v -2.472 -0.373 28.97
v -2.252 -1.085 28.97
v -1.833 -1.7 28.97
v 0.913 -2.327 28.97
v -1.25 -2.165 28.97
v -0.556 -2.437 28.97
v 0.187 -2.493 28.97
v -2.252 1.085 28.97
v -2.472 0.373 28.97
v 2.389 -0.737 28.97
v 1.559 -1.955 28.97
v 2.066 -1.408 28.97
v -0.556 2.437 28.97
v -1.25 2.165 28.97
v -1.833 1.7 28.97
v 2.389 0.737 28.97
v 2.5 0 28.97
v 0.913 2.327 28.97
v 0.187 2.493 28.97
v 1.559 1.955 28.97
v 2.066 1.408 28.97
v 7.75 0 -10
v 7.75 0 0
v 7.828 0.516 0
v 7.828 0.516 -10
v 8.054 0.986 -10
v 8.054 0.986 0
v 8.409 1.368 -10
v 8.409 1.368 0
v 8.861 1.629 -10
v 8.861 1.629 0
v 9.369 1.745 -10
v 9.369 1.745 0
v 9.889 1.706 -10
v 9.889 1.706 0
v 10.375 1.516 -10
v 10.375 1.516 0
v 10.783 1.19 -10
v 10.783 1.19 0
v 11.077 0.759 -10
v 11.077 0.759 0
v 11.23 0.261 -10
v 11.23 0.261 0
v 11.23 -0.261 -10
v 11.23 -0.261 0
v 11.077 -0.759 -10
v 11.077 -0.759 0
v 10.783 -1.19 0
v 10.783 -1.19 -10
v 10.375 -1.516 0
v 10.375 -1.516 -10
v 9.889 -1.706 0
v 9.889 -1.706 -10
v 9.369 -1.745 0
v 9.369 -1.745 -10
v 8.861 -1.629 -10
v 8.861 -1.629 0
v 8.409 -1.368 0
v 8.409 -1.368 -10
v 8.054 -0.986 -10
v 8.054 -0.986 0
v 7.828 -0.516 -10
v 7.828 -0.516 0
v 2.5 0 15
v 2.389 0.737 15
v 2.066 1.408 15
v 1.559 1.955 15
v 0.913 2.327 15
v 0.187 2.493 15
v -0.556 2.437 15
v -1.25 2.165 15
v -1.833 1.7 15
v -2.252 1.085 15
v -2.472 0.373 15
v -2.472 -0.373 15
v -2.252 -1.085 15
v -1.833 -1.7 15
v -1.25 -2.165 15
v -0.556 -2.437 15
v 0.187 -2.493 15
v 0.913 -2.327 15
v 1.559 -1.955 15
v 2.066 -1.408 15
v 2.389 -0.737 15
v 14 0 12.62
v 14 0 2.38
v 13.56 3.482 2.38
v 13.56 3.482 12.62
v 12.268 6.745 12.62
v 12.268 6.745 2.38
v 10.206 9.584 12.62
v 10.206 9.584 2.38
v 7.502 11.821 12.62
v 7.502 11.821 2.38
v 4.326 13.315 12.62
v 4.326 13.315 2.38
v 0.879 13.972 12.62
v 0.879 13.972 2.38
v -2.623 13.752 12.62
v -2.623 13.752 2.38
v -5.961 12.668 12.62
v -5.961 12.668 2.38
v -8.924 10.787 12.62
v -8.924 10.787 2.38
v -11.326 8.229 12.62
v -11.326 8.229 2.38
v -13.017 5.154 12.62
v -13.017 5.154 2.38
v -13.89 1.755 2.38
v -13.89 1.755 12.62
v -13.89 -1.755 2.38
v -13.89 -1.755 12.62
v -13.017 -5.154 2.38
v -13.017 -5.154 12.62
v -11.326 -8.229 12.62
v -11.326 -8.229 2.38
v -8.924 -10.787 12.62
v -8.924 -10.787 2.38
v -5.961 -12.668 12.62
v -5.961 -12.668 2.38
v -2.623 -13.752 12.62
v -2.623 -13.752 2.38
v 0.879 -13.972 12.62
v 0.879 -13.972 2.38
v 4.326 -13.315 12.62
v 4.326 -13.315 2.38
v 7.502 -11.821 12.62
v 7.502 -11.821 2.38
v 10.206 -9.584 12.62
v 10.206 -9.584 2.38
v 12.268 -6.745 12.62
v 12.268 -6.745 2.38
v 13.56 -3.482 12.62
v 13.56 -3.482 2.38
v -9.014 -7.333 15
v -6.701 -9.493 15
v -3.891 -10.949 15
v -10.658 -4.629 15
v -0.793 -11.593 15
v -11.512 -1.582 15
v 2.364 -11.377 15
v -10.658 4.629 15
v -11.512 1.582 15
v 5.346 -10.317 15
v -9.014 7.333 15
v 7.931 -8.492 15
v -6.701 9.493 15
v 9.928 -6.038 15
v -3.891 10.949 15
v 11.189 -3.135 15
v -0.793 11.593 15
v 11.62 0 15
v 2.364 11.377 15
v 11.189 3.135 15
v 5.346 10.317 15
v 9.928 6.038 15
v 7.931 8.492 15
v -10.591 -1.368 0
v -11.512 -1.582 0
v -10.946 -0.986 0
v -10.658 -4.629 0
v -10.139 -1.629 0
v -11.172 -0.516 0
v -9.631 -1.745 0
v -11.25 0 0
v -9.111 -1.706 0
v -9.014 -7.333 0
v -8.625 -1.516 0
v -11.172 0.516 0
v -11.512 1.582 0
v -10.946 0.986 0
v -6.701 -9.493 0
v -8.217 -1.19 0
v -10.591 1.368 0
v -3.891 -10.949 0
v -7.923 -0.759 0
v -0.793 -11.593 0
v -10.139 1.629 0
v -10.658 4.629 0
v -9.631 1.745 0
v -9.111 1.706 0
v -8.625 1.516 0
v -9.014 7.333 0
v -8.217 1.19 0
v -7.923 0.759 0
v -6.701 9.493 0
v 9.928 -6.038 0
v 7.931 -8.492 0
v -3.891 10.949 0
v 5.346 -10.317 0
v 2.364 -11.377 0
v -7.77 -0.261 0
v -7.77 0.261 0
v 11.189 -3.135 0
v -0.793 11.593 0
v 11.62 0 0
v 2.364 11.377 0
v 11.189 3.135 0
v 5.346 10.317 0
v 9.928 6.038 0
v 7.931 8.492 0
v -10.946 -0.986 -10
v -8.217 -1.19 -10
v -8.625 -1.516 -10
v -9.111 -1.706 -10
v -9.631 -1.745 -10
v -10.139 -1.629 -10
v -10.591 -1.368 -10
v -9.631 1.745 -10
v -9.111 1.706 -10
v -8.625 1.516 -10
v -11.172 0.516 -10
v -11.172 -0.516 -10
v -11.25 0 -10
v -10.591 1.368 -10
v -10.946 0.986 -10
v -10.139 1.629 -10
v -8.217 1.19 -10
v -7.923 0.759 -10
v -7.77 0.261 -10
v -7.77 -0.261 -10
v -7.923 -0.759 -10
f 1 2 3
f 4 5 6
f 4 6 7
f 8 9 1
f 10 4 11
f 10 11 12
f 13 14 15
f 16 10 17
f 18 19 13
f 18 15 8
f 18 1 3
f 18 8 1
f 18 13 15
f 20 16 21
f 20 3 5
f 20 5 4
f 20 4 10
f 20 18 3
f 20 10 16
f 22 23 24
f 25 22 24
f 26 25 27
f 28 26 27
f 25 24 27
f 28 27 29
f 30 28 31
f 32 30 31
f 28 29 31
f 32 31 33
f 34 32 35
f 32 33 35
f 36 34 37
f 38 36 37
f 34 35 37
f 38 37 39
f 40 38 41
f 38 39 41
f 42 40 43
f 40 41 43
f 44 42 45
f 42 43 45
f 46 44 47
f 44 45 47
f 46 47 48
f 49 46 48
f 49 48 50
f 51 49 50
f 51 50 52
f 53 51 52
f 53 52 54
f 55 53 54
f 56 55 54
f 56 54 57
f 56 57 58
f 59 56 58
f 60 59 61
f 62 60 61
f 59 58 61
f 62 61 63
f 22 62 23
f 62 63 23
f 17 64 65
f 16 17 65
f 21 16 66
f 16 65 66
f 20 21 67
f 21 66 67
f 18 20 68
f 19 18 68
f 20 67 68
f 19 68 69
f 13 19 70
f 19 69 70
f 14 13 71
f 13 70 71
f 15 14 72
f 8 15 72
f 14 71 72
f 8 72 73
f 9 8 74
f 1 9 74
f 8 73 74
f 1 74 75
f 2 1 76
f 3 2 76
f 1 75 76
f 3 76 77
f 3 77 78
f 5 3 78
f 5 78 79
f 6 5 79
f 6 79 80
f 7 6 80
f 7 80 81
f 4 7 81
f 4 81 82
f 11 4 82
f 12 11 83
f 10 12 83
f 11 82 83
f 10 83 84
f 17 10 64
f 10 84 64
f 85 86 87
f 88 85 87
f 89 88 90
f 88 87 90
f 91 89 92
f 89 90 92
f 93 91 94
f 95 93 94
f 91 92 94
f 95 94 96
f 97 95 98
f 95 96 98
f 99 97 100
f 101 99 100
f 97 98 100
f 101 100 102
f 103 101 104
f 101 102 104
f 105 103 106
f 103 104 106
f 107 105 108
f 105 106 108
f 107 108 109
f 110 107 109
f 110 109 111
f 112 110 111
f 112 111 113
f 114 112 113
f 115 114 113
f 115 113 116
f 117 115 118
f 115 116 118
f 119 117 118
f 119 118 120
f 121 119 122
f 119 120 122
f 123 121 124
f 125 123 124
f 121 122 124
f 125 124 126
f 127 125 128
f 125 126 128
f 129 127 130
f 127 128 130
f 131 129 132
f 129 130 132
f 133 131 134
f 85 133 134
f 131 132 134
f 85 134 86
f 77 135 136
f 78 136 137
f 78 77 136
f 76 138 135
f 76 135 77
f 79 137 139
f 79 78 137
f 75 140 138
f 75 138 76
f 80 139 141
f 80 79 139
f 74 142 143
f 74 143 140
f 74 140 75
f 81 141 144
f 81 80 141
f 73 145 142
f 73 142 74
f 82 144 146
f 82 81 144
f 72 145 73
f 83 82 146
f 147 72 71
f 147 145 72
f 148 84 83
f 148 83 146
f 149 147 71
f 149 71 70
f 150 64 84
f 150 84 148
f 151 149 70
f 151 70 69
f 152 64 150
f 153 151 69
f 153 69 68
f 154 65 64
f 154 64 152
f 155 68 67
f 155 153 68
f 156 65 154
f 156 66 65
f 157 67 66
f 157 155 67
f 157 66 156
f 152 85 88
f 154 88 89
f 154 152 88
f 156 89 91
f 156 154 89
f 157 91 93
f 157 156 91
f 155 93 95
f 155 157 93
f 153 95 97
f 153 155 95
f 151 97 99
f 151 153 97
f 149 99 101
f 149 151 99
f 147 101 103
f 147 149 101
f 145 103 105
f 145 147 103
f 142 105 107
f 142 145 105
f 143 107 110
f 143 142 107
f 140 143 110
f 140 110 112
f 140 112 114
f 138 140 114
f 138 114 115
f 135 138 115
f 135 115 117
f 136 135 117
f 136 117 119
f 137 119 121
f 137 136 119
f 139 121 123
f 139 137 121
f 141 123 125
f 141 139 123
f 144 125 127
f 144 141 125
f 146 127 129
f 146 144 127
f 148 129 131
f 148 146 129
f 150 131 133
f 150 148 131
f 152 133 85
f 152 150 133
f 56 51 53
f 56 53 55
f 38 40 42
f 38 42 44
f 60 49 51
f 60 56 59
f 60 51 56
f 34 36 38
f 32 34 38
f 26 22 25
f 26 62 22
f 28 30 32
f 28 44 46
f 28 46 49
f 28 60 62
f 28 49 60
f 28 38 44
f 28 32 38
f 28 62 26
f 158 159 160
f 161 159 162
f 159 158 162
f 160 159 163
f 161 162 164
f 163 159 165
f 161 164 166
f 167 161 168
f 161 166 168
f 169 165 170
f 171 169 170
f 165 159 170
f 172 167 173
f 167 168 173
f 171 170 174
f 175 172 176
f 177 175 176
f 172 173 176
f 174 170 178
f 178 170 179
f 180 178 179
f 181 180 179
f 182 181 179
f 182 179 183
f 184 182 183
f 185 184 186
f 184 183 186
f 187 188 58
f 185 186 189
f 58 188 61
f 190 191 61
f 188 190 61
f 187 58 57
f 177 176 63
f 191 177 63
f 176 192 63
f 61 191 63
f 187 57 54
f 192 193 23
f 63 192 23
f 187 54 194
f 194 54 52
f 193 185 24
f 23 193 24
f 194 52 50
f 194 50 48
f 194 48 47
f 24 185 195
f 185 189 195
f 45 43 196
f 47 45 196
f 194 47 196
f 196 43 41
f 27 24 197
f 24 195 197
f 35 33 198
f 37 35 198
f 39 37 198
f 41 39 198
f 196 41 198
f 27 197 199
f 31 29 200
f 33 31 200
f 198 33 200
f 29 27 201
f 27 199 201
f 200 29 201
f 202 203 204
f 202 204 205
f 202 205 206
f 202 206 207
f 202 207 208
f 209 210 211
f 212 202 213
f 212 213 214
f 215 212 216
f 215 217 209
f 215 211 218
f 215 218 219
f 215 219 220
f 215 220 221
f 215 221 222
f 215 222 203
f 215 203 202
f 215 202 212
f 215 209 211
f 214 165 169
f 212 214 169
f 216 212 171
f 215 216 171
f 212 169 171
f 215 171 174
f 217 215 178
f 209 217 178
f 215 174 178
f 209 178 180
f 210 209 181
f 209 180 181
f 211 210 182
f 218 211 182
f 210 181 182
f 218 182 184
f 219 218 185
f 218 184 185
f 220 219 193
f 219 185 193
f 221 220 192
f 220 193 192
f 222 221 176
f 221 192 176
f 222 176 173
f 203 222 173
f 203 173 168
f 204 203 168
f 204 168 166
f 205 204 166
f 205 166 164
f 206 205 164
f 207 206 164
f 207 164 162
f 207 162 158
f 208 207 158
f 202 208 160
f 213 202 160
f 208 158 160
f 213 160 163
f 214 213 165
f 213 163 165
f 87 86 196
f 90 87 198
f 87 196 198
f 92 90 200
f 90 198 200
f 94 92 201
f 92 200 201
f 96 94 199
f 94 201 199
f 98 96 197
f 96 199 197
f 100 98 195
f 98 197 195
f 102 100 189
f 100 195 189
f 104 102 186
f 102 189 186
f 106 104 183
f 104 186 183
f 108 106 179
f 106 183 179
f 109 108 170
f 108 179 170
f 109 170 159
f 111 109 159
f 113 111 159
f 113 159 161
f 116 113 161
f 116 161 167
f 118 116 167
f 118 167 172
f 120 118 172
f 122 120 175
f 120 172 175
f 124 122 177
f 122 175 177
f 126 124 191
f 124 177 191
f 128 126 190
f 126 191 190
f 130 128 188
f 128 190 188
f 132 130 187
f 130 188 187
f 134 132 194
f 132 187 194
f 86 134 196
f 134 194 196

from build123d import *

# Parameters (mm, degrees)
SKETCH1_R           = 14
BOSS_EXTRUDE1_DEPTH = 15
CHAMFER1_SIZE       = 2.38
SKETCH3_R           = 2.5
BOSS_EXTRUDE2_DEPTH = 13.97
SKETCH5_R           = 1.75
BOSS_EXTRUDE4_DEPTH = 10


with BuildPart() as part:
    # Sketch1 → Boss-Extrude1 (new body)
    with BuildSketch(Plane.XY):
        Circle(SKETCH1_R)
    extrude(amount=BOSS_EXTRUDE1_DEPTH)

    # Chamfer1
    chamfer1_edges = [part.edges().sort_by_distance(p)[0] for p in [
        (-14, 0, 0),
        (-14, 0, 15),
    ]]
    chamfer(chamfer1_edges, length=CHAMFER1_SIZE)

    # Sketch3 → Boss-Extrude2 (add)
    with BuildSketch(Plane.XY.offset(15)):
        Circle(SKETCH3_R)
    extrude(amount=BOSS_EXTRUDE2_DEPTH)

    # Sketch5 → Boss-Extrude4 (add)
    with BuildSketch(Plane(origin=(0, 0, 0), x_dir=(-1, 0, 0), z_dir=(0, 0, -1))):
        with Locations((-9.5, 0)):
            Circle(SKETCH5_R)
        with Locations((9.5, 0)):
            Circle(SKETCH5_R)
    extrude(amount=BOSS_EXTRUDE4_DEPTH)


solid = part.part
